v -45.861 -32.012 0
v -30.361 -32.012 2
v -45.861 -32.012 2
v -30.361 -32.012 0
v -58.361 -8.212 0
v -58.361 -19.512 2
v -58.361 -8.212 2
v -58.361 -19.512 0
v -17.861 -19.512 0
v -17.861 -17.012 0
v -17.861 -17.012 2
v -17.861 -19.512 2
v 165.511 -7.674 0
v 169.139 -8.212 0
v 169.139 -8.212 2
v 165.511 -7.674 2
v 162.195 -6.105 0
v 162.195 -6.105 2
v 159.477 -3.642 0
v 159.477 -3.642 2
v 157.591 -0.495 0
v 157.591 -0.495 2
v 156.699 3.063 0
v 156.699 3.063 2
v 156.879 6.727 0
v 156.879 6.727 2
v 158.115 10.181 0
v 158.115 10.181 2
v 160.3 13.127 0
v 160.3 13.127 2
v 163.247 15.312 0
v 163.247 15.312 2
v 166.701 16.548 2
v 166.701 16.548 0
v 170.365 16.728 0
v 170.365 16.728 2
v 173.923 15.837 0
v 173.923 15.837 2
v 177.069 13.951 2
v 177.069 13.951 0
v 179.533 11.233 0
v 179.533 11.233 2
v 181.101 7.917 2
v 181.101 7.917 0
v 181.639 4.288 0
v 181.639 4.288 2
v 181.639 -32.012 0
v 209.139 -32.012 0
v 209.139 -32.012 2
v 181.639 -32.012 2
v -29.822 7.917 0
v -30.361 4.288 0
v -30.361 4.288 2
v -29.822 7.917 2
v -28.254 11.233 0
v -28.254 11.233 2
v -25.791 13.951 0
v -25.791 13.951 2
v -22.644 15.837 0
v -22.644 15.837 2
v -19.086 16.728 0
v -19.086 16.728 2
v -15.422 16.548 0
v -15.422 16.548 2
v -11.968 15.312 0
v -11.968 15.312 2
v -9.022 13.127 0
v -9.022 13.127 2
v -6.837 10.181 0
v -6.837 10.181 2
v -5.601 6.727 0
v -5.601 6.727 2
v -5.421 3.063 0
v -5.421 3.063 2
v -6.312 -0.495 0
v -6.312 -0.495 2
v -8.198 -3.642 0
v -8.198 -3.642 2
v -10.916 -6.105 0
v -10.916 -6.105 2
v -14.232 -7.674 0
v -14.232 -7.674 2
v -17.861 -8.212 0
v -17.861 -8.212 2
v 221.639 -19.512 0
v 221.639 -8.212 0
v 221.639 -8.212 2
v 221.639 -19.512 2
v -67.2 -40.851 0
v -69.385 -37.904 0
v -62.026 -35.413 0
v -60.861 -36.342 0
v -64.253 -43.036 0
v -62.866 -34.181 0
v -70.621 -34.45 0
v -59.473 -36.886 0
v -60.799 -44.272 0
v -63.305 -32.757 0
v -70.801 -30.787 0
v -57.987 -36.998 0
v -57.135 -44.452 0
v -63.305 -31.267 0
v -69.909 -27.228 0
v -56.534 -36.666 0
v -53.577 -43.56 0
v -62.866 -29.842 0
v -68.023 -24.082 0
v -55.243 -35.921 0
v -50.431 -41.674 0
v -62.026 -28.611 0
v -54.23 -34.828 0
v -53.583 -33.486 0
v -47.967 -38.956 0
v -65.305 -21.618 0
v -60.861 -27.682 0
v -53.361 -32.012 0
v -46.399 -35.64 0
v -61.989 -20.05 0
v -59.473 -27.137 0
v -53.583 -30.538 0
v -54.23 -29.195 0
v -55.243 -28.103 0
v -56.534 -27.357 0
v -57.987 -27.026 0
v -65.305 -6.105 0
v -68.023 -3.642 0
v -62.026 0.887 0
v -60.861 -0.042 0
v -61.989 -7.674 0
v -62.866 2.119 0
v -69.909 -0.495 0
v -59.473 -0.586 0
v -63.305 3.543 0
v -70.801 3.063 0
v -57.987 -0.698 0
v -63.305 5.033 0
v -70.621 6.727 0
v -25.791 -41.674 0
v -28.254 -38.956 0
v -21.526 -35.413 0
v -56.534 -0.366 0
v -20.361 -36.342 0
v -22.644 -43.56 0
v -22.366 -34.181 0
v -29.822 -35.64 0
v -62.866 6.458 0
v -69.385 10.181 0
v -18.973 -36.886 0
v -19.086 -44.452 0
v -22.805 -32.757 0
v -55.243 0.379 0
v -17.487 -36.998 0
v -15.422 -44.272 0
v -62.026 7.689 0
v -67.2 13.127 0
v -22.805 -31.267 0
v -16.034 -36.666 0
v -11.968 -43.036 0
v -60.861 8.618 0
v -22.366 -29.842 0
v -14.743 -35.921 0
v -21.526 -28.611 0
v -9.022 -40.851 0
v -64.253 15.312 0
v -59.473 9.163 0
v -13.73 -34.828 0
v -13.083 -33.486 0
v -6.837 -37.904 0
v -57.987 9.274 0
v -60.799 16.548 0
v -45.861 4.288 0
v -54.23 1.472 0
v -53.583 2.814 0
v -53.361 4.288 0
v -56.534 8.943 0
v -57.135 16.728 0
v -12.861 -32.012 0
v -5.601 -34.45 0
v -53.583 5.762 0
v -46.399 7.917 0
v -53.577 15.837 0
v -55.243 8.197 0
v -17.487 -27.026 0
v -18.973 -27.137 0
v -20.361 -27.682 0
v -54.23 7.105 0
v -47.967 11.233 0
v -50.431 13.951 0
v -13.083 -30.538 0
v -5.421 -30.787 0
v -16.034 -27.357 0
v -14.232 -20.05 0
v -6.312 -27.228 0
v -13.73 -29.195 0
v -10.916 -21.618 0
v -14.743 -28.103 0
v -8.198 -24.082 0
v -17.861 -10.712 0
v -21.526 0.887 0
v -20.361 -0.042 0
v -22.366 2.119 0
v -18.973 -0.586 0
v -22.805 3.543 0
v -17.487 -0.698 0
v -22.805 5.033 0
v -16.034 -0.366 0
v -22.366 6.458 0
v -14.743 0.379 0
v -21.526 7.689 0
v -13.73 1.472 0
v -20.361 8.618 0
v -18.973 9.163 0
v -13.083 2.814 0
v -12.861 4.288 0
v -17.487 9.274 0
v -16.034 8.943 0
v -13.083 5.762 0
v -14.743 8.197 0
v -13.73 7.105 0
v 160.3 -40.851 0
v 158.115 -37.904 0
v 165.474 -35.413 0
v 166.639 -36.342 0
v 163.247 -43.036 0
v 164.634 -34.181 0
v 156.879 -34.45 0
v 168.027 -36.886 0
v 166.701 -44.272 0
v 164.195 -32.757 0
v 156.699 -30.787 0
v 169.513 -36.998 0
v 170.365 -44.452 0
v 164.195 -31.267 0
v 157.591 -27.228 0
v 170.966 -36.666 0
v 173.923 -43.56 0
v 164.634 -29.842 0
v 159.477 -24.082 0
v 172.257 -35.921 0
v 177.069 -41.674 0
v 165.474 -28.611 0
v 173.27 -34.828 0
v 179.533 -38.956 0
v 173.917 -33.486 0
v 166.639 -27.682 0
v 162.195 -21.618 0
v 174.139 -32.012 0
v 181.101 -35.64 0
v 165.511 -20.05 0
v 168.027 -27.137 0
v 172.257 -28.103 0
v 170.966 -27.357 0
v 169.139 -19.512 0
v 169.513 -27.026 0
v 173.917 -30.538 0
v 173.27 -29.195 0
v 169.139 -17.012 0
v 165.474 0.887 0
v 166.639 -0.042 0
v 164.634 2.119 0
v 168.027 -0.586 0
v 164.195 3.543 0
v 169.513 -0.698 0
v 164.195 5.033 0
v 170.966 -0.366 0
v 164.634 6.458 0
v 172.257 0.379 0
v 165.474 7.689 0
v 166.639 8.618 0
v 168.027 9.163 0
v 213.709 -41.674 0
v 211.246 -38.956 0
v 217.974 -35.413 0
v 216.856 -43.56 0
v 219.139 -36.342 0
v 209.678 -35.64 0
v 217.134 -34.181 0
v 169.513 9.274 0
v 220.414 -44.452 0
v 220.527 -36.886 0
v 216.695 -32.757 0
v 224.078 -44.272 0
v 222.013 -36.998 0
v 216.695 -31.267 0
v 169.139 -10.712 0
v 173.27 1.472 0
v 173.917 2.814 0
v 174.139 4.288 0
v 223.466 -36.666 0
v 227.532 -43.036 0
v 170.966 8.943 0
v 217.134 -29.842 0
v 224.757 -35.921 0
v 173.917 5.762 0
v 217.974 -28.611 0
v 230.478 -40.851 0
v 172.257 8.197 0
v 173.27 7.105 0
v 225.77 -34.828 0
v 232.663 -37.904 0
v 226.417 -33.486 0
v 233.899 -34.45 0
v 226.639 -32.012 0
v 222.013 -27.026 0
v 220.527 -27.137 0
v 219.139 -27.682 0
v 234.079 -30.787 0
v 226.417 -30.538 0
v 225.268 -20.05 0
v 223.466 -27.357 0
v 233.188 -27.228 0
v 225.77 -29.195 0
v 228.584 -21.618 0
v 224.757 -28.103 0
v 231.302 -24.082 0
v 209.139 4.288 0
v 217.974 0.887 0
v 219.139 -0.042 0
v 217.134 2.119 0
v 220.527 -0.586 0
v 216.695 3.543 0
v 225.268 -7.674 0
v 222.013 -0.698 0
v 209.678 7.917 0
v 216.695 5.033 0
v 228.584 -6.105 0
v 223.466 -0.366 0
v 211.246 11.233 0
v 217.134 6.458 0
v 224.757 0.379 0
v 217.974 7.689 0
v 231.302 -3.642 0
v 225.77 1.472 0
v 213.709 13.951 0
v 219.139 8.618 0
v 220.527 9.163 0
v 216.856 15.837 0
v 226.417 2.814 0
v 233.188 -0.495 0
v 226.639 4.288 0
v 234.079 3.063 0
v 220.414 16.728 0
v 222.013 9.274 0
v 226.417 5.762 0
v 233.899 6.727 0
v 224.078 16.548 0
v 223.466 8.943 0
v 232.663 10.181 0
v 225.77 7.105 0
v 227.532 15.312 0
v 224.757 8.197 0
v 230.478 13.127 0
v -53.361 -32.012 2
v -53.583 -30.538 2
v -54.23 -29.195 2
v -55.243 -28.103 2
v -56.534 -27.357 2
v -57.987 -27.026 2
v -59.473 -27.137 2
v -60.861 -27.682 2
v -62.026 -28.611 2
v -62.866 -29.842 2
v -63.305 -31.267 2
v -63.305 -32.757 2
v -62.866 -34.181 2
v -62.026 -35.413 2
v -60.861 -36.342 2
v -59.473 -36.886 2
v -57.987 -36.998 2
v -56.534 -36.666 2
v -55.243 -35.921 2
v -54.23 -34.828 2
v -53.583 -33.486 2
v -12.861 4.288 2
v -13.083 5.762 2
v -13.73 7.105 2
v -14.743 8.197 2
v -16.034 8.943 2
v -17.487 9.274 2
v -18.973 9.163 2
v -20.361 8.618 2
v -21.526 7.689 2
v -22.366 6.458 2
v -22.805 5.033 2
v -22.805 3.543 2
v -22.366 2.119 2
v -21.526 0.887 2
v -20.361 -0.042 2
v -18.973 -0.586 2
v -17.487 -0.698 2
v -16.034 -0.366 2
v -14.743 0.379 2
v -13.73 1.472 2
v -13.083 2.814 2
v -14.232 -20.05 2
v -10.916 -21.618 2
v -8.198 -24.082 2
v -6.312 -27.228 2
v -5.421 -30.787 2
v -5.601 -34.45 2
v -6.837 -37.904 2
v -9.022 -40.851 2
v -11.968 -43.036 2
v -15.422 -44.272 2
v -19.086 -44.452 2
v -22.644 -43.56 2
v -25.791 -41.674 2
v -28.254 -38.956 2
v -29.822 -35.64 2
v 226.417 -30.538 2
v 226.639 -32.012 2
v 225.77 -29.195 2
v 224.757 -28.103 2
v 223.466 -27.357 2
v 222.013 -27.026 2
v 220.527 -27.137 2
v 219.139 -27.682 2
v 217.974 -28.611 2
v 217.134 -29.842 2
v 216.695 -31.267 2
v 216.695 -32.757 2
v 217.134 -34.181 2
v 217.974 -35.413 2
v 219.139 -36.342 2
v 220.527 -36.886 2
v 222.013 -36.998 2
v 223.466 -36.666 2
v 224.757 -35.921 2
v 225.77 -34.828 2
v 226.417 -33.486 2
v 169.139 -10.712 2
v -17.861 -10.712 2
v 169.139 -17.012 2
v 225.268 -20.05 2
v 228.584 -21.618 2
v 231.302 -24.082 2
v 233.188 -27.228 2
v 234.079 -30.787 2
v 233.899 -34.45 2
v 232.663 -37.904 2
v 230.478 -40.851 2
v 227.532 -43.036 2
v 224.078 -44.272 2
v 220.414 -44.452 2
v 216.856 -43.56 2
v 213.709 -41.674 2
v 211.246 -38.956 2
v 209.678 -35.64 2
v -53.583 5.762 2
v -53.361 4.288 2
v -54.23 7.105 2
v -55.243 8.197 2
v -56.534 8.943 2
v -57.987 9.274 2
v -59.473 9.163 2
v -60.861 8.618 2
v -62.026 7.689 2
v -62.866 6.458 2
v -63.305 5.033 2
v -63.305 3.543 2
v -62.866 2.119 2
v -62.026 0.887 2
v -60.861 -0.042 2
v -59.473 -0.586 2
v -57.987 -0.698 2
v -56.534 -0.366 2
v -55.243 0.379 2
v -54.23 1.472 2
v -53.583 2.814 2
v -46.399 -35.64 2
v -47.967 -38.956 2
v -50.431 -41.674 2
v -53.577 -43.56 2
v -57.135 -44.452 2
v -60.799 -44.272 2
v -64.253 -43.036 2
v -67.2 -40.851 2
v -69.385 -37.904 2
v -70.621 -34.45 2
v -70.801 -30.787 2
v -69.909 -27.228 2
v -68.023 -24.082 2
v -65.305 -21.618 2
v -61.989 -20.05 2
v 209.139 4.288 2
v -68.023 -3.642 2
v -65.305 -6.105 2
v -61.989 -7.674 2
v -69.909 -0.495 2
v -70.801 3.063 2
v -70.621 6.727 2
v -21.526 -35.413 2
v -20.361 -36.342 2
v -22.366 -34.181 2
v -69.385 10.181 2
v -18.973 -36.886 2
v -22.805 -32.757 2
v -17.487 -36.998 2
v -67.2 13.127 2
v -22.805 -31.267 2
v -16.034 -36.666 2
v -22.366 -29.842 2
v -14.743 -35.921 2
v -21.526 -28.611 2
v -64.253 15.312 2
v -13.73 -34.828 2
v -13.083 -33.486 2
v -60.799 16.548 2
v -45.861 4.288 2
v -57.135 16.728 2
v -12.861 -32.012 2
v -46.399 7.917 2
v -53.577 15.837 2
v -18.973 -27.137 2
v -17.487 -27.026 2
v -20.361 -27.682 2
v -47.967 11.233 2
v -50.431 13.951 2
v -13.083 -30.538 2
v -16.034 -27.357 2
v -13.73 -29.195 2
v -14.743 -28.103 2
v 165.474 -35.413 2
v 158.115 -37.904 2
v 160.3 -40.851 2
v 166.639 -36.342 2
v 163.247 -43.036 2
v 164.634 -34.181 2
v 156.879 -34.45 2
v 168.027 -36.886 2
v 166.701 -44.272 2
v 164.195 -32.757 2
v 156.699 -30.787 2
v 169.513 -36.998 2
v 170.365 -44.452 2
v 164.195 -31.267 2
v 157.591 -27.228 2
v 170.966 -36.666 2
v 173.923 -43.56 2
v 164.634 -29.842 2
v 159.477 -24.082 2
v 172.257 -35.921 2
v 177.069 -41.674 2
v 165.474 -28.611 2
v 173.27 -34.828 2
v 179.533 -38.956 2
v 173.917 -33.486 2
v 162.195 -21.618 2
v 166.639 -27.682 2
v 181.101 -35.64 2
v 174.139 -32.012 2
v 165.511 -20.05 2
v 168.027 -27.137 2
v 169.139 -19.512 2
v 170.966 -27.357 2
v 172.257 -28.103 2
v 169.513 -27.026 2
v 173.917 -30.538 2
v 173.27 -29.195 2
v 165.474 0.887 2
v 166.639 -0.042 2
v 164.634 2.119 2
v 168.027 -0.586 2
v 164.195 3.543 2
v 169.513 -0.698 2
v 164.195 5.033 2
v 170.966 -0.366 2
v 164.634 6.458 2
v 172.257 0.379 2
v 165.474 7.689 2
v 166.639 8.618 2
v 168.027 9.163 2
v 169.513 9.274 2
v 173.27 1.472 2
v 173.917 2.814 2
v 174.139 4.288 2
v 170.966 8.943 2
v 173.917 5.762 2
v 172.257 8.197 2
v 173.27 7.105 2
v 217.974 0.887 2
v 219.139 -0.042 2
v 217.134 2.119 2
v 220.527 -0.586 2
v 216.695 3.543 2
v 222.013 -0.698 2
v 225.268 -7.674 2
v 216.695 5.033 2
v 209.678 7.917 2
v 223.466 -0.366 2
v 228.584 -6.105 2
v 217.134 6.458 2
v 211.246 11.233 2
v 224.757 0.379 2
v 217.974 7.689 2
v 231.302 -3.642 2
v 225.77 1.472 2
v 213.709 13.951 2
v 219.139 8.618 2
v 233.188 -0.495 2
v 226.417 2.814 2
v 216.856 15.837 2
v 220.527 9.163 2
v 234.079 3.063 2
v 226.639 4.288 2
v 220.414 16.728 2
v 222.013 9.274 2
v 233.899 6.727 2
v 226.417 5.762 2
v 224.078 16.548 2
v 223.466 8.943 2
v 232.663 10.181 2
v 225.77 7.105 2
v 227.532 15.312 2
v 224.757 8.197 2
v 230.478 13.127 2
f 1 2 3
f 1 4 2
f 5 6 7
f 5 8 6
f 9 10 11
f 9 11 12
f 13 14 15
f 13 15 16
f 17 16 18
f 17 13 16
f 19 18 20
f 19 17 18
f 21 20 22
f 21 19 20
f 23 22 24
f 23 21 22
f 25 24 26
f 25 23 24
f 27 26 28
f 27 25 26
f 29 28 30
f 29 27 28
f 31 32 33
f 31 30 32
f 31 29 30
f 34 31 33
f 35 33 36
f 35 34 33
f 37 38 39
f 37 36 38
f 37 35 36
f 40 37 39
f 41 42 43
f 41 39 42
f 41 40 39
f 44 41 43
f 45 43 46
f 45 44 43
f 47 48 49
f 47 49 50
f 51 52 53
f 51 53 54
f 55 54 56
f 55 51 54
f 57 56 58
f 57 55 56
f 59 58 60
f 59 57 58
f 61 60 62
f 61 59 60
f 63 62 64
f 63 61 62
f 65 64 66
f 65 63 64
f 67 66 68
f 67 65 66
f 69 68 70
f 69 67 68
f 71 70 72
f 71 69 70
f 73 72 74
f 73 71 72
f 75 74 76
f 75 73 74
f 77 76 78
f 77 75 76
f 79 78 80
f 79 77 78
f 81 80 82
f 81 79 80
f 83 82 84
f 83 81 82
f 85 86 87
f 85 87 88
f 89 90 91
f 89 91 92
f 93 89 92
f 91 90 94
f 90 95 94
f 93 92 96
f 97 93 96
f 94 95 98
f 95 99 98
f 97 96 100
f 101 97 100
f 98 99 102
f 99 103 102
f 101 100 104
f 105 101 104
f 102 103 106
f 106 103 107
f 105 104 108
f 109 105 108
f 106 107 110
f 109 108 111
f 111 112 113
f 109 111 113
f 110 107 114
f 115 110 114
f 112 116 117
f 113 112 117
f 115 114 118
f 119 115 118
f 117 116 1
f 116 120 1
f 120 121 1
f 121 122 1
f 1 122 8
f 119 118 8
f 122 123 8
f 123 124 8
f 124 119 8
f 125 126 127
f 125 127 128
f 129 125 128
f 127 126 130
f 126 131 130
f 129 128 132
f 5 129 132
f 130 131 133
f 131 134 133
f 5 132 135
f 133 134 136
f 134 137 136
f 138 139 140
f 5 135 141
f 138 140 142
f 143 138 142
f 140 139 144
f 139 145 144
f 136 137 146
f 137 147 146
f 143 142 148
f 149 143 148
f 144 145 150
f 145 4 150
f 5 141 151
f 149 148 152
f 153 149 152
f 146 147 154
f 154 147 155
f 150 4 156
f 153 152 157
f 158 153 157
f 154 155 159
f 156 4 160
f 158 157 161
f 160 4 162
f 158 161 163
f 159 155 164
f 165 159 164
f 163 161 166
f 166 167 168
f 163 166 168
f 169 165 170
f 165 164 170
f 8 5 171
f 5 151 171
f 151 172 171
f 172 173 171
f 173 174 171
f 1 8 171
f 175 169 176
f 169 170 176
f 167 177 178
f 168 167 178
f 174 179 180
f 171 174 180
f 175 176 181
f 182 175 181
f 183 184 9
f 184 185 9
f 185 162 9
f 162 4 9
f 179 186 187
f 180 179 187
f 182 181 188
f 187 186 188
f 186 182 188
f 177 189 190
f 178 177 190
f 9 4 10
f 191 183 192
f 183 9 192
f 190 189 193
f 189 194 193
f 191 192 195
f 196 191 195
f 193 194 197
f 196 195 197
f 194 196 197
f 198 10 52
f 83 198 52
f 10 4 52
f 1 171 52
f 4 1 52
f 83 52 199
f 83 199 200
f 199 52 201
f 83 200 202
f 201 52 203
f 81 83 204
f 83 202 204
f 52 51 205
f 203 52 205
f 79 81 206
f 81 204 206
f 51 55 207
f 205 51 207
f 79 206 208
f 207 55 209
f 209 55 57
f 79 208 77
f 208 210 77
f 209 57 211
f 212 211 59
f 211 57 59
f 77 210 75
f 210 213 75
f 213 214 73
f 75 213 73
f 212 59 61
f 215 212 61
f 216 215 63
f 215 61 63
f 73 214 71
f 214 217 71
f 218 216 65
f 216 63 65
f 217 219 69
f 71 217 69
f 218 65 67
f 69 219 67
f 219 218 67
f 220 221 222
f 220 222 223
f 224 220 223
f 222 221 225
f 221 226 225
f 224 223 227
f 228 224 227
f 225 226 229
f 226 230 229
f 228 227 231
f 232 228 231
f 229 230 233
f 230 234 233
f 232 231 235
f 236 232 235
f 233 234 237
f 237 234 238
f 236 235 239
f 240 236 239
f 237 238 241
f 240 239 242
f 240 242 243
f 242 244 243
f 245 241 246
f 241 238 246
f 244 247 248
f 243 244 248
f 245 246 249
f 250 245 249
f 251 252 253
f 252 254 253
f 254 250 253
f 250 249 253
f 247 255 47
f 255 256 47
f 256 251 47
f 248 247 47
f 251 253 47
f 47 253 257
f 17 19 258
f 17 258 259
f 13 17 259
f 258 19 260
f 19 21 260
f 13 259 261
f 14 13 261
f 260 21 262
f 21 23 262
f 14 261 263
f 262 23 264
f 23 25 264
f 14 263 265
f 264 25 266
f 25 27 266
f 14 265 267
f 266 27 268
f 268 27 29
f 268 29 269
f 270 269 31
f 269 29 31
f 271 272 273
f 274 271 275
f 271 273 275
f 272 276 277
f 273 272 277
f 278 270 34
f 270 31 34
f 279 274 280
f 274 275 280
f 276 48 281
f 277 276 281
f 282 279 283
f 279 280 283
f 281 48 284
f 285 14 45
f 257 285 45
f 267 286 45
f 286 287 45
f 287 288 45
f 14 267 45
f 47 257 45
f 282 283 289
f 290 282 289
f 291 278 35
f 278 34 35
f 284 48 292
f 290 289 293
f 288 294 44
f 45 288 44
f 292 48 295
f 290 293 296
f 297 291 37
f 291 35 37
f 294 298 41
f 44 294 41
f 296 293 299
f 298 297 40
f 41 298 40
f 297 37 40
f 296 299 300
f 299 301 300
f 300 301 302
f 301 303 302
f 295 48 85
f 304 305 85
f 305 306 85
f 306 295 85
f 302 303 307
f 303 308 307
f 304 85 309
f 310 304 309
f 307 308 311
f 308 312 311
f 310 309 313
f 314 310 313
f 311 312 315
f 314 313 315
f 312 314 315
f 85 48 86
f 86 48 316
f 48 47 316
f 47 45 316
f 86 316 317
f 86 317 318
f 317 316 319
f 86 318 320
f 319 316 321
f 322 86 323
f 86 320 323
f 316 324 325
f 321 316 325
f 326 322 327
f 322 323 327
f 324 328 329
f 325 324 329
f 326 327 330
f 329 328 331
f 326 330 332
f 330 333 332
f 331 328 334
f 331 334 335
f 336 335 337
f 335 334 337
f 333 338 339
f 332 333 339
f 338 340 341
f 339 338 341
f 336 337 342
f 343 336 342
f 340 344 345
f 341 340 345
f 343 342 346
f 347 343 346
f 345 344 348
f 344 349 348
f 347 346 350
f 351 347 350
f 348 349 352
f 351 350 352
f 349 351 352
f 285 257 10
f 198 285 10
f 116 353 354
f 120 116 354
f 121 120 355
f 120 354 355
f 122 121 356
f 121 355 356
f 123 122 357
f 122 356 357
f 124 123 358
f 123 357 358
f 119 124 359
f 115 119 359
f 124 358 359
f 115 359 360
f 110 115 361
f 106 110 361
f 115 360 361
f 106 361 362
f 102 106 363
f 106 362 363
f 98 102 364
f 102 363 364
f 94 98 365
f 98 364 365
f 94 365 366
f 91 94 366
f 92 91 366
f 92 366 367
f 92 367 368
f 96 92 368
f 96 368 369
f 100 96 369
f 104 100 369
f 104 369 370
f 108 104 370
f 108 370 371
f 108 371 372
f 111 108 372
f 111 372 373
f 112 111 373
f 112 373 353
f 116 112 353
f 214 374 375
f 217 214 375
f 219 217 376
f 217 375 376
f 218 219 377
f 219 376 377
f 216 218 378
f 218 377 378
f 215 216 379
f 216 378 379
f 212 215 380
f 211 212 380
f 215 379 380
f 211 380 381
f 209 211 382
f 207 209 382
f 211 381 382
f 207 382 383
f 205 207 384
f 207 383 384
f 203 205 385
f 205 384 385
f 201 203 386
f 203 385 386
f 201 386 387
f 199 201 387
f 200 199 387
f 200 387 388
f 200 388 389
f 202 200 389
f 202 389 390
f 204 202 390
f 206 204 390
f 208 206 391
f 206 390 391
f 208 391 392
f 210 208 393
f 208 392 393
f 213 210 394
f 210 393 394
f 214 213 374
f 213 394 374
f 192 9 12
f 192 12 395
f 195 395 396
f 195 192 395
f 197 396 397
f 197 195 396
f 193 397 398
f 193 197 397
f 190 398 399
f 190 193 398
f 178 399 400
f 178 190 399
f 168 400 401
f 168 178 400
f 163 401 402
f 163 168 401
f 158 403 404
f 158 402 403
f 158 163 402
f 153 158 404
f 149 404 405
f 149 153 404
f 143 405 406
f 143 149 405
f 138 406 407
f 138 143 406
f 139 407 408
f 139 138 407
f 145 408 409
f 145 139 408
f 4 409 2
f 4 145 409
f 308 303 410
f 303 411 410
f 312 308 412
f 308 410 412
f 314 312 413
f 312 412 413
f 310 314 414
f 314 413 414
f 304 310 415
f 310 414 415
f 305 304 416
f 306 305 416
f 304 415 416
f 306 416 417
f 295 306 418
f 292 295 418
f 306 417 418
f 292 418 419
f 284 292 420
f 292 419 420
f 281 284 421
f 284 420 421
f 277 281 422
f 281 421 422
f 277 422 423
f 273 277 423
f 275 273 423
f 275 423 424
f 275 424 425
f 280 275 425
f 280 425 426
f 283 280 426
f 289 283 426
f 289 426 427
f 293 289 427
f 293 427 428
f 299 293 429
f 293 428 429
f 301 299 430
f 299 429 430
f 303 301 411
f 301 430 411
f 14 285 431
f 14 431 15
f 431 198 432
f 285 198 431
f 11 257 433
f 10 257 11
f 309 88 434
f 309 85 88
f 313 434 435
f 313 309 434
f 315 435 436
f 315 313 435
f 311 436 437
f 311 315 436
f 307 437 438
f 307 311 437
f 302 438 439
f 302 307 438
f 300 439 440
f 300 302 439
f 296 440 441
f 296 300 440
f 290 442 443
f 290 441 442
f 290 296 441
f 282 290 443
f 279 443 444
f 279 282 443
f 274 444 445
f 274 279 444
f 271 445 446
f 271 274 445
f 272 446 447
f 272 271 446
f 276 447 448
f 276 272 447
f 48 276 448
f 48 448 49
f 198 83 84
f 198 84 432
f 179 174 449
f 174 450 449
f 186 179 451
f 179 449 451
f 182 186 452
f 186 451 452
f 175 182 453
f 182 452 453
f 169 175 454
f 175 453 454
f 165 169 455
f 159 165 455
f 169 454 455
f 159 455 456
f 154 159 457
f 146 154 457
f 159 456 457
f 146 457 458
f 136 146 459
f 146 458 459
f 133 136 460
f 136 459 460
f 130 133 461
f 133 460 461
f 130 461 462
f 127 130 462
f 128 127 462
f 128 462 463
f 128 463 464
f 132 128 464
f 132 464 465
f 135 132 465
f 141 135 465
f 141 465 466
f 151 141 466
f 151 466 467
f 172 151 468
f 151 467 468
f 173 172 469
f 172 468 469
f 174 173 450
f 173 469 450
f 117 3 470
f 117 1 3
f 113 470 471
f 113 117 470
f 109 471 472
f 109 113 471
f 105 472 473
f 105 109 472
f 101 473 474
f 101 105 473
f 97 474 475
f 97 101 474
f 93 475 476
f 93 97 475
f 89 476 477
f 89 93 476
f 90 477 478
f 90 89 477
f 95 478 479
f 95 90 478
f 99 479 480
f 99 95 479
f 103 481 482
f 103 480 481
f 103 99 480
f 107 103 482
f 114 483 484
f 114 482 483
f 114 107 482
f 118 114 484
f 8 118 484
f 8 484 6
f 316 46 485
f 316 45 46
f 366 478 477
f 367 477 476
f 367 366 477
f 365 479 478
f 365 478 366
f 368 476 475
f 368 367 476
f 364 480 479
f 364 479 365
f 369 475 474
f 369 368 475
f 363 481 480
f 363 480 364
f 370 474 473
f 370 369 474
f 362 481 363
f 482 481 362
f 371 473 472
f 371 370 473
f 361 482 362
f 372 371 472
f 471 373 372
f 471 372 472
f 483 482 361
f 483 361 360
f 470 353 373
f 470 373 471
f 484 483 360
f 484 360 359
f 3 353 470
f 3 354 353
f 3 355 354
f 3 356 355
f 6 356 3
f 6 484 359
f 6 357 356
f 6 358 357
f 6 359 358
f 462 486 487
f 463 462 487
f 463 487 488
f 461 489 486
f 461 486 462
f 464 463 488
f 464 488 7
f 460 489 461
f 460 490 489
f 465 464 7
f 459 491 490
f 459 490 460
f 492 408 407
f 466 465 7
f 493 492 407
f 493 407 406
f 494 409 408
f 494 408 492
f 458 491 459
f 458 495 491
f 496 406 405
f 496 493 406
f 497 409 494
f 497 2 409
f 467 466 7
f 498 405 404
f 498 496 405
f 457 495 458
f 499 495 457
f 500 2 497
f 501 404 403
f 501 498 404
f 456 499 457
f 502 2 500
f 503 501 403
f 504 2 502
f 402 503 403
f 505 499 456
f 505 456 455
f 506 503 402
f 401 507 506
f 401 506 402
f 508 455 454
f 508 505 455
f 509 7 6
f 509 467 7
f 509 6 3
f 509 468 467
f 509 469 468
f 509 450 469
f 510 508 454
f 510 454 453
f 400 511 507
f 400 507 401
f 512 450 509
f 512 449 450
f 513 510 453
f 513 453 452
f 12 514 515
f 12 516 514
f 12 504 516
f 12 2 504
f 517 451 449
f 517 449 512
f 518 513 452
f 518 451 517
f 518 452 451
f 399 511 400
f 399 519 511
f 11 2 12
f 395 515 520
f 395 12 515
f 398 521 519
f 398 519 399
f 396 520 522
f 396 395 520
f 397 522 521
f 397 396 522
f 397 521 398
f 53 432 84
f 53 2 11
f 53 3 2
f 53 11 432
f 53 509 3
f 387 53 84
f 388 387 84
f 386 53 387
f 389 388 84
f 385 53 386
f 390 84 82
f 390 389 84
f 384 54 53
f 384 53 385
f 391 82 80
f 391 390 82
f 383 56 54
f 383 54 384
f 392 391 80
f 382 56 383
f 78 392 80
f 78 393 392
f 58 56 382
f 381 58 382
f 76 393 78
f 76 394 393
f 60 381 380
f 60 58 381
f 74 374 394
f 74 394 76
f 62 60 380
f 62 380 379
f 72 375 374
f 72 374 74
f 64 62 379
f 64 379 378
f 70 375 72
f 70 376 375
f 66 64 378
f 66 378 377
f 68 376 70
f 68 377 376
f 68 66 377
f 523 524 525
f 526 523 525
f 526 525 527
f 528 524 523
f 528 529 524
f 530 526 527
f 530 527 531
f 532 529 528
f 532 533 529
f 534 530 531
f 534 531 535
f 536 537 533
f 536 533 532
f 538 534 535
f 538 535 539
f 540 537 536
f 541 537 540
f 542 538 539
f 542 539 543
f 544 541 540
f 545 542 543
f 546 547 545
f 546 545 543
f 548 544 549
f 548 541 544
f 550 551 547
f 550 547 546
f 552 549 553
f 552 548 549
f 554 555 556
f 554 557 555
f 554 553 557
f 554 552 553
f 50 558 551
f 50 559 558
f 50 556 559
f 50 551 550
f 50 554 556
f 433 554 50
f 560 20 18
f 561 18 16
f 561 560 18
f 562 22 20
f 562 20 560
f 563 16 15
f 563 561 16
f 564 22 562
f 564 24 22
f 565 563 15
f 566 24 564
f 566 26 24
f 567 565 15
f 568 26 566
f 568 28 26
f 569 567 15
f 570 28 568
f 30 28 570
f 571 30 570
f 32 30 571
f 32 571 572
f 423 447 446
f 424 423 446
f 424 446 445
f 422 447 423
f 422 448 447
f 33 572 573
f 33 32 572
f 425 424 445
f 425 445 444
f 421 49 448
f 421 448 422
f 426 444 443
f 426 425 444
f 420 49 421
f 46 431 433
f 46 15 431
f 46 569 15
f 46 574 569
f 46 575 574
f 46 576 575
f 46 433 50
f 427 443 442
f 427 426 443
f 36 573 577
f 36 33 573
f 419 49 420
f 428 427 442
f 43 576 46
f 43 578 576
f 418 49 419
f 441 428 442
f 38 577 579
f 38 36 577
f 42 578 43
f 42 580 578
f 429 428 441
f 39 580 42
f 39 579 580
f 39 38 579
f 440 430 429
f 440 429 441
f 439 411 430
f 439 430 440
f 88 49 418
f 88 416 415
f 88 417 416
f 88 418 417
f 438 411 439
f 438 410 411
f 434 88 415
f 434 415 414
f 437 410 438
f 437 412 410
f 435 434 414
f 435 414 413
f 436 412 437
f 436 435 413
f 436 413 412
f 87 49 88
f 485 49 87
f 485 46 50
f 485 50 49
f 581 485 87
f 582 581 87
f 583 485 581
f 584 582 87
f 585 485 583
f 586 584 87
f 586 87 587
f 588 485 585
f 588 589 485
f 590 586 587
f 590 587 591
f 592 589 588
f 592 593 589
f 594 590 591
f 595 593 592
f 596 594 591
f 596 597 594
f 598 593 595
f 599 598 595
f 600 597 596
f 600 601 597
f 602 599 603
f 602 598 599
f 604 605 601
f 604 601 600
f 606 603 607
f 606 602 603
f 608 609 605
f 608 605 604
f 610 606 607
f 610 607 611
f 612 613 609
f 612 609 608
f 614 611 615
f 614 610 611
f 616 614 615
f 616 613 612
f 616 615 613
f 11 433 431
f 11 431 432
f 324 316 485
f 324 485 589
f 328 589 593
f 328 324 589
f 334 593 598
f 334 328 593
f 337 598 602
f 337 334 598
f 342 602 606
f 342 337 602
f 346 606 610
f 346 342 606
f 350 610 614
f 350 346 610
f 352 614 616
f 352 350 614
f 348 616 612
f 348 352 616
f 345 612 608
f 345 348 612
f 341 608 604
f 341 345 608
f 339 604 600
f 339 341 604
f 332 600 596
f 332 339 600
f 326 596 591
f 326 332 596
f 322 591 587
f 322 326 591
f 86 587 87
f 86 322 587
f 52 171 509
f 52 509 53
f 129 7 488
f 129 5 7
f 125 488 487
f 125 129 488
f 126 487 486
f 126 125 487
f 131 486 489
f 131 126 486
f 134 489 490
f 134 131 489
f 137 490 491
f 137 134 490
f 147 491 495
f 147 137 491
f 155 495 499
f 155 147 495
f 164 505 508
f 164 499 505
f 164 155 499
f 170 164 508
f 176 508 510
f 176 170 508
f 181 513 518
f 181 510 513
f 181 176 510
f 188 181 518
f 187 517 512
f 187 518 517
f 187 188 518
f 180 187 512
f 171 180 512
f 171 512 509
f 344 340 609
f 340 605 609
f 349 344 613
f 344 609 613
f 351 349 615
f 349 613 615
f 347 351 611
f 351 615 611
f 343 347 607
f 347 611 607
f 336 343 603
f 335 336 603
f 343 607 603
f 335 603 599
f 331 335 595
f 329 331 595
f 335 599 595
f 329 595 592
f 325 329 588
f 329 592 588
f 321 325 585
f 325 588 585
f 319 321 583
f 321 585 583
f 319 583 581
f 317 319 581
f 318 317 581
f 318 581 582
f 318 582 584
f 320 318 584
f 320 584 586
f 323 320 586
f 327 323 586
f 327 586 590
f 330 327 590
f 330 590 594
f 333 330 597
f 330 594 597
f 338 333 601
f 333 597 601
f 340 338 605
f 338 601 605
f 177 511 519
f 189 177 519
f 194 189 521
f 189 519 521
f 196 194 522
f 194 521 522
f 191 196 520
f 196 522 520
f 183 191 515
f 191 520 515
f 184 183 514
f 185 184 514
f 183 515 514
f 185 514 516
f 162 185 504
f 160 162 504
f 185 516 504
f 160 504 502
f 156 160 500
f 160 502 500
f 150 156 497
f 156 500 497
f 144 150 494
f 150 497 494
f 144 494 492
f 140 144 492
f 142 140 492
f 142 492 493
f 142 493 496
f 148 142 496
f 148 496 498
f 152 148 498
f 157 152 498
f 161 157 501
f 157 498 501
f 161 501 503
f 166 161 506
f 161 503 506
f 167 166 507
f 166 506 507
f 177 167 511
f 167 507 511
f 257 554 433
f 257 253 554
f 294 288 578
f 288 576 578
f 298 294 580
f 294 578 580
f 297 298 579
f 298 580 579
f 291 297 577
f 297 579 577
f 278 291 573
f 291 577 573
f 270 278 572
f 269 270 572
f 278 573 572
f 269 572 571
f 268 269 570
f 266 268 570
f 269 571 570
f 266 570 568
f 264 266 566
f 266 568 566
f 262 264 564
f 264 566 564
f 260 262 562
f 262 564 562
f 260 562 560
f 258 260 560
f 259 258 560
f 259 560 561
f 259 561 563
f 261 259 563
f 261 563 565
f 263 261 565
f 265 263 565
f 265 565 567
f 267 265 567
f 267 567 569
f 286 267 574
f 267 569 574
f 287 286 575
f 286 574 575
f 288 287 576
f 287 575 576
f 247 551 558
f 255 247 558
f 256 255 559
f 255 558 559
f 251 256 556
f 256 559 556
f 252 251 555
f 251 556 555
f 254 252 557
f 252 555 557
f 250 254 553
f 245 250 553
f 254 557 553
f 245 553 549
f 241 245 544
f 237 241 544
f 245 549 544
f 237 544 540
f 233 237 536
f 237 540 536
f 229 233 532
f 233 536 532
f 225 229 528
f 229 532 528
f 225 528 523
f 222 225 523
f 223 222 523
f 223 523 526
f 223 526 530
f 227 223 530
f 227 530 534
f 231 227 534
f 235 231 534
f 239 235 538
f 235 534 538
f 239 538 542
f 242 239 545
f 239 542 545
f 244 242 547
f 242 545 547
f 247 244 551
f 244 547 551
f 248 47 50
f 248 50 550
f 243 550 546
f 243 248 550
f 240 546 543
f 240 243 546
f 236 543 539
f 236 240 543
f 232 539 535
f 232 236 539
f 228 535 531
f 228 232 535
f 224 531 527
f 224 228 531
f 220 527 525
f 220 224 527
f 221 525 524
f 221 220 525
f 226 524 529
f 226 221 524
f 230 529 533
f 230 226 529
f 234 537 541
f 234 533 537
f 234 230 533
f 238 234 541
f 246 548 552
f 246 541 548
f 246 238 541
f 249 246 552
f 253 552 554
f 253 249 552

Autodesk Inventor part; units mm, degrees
ref_plane "YZ Plane" through (0, 0, 0) normal (1, 0, 0) x (0, 1, 0)
ref_plane "XZ Plane" through (0, 0, 0) normal (0, 1, 0) x (-1, 0, 0)
ref_plane "XY Plane" through (0, 0, 0) normal (0, 0, 1) x (1, 0, 0)
sketch "Sketch1" plane through (0, 0, 0) normal (0, 0, 1) x (1, 0, 0)
  line L0 (169.1393, 4.2882) -> (221.6393, 4.2882)
  line L1 (221.6393, 4.2882) -> (221.6393, -32.0118)
  line L2 (221.6393, -32.0118) -> (169.1393, -32.0118)
  line L3 (169.1393, -32.0118) -> (169.1393, 4.2882)
  line L4 (-58.3607, 4.2882) -> (-17.8607, 4.2882)
  line L5 (-17.8607, 4.2882) -> (-17.8607, -32.0118)
  line L6 (-17.8607, -32.0118) -> (-58.3607, -32.0118)
  line L7 (-58.3607, -32.0118) -> (-58.3607, 4.2882)
  circle A0 centre (-58.3607, 4.2882) radius 12.5
  circle A1 centre (-58.3607, -32.0118) radius 12.5
  circle A2 centre (-17.8607, -32.0118) radius 12.5
  circle A3 centre (-17.8607, 4.2882) radius 12.5
  circle A4 centre (169.1393, 4.2882) radius 12.5
  circle A5 centre (169.1393, -32.0118) radius 12.5
  circle A6 centre (221.6393, -32.0118) radius 12.5
  circle A7 centre (221.6393, 4.2882) radius 12.5
  line L8 (-34.8317, -10.7118) -> (176.5512, -10.7118)
  line L9 (176.5512, -10.7118) -> (176.5512, -17.0118)
  line L10 (176.5512, -17.0118) -> (-34.8317, -17.0118)
  line L11 (-34.8317, -17.0118) -> (-34.8317, -10.7118)
  dimension "d0" = 36.3
  dimension "d1" = 40.5
  dimension "d2" = 52.5
  dimension "d3" = 239.5
  dimension "d4" = 25
  dimension "d5" = 15
  dimension "d6" = 15
extrude "Extrusion1" add sketch "Sketch1" along normal blind 2
sketch "Sketch2" plane through (0, 0, 2) normal (0, 0, 1) x (1, 0, 0)
  circle A0 centre (-58.3607, 4.2882) radius 5
  circle A1 centre (-58.3607, -32.0118) radius 5
  circle A2 centre (-17.8607, -32.0118) radius 5
  circle A3 centre (-17.8607, 4.2882) radius 5
  circle A4 centre (169.1393, 4.2882) radius 5
  circle A5 centre (169.1393, -32.0118) radius 5
  circle A6 centre (221.6393, -32.0118) radius 5
  circle A7 centre (221.6393, 4.2882) radius 5
  arc A8 (-45.8607, 4.2882) -> (-58.3607, -8.2118) centre (-58.3607, 4.2882) ccw projected
  arc A9 (-17.8607, -8.2118) -> (-30.3607, 4.2882) centre (-17.8607, 4.2882) ccw projected
  arc A10 (-58.3607, -19.5118) -> (-45.8607, -32.0118) centre (-58.3607, -32.0118) ccw projected
  arc A11 (-30.3607, -32.0118) -> (-17.8607, -19.5118) centre (-17.8607, -32.0118) ccw projected
  arc A12 (169.1393, -19.5118) -> (181.6393, -32.0118) centre (169.1393, -32.0118) ccw projected
  arc A13 (181.6393, 4.2882) -> (169.1393, -8.2118) centre (169.1393, 4.2882) ccw projected
  arc A14 (221.6393, -8.2118) -> (209.1393, 4.2882) centre (221.6393, 4.2882) ccw projected
  arc A15 (209.1393, -32.0118) -> (221.6393, -19.5118) centre (221.6393, -32.0118) ccw projected
  point P0 (0, 0)
  dimension "d9" = 10
extrude "Extrusion2" cut sketch "Sketch2" against normal blind 2
equation "\"d6\" = d5"
properties part number "NerfMount"
